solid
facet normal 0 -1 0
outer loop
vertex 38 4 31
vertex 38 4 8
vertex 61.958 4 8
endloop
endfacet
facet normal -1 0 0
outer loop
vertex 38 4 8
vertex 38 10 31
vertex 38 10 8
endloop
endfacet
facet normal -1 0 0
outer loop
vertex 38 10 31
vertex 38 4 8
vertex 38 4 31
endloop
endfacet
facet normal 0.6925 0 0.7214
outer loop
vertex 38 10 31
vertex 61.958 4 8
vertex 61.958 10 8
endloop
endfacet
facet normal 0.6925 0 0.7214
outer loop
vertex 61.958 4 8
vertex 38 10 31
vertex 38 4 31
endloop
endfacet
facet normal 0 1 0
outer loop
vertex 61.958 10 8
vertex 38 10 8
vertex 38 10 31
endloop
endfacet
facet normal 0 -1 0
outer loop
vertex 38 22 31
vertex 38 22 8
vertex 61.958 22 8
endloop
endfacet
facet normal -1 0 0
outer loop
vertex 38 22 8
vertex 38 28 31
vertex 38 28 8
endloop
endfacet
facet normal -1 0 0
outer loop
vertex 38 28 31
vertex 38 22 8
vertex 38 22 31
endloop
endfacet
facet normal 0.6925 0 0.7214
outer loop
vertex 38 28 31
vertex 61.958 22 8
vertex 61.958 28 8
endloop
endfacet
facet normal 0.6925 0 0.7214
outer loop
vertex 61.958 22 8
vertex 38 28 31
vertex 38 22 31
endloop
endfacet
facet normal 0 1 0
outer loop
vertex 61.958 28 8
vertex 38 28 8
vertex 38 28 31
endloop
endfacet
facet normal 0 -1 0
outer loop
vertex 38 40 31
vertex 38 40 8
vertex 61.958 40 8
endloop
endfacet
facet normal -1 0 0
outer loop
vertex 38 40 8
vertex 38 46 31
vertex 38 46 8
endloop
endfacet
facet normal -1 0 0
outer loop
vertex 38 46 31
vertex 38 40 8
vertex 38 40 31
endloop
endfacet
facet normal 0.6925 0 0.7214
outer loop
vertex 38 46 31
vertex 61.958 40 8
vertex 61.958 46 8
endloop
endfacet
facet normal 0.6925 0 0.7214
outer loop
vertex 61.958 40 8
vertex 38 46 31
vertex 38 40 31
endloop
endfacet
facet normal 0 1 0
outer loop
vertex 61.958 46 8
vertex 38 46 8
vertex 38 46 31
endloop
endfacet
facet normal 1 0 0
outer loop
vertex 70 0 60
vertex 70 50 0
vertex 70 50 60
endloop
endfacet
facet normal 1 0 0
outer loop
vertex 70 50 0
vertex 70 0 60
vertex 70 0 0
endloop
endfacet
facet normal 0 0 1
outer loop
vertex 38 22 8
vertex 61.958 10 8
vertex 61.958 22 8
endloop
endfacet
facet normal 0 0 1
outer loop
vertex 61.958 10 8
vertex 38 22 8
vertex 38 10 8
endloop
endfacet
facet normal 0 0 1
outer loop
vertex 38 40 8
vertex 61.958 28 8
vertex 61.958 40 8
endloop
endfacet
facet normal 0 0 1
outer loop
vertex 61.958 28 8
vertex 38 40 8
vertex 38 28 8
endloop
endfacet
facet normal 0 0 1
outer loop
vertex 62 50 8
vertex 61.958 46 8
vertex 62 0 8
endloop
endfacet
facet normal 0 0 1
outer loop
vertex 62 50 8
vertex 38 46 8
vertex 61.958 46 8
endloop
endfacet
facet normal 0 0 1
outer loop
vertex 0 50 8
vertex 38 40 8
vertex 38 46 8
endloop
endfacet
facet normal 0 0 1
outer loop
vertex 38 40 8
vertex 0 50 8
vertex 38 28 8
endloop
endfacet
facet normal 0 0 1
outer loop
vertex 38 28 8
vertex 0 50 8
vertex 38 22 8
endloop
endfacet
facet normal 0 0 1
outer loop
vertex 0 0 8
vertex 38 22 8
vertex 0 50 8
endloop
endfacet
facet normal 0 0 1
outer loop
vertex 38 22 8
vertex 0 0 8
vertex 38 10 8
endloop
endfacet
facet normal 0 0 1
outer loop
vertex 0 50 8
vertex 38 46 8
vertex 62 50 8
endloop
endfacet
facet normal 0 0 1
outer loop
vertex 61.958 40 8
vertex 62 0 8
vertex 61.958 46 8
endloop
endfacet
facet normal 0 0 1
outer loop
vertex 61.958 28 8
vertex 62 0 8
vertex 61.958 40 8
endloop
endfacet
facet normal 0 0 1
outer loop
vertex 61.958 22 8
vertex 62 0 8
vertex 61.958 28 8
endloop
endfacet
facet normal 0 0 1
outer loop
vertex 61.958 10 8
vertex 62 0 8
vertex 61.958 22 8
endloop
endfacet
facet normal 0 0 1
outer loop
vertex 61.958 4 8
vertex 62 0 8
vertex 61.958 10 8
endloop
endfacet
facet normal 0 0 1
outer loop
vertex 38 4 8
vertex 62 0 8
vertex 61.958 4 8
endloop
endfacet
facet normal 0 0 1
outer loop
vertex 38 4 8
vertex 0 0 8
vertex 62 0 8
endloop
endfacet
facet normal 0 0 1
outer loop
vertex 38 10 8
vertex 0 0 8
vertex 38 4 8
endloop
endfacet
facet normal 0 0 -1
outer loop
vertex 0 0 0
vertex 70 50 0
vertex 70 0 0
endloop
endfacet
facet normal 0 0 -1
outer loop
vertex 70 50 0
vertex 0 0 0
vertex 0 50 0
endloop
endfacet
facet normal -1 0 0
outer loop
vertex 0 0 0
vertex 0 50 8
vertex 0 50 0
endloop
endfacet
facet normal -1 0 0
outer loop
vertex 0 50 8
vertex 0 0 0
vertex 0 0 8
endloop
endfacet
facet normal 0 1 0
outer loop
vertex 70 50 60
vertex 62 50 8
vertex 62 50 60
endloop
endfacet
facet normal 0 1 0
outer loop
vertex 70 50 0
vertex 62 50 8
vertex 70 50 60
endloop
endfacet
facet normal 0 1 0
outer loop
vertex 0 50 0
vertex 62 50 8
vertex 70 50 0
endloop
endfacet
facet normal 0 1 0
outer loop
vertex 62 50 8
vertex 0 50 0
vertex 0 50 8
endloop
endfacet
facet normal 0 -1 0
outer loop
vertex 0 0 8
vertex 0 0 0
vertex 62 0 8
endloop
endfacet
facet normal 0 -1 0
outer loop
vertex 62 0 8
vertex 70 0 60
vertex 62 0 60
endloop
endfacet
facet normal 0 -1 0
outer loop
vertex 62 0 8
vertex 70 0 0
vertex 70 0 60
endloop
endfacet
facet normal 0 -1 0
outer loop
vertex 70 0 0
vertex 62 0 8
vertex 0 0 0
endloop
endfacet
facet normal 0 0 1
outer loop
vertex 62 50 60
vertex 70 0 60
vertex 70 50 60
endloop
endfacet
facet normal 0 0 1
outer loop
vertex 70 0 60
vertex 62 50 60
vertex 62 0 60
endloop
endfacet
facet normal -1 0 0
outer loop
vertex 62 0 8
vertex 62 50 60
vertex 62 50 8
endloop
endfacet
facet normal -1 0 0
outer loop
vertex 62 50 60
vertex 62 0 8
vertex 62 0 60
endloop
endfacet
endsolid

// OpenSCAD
$fn = 32;

// ----------------------------------------------------------------------
// Rib bracket: 3-gusset L bracket
// ----------------------------------------------------------------------

// --- parameters (mm) ---
base_l = 70;              // foot length, X
base_w = 50;              // foot width, Y
base_t = 8;               // foot thickness
plate_t = 8;              // upright plate thickness
plate_h = 60;             // overall height
gus_l = 24;               // gusset leg along the foot
gus_h = 24;               // gusset height
gus_t = 6;                // gusset thickness
gus_edge = 4;             // gusset margin from the foot edge
n_gus = 3;                // gusset count

gus_pitch = (base_w - 2 * gus_edge - gus_t) / (n_gus - 1);  // gusset pitch

union() {
  cube([base_l, base_w, base_t]);
  translate([base_l - plate_t, 0, base_t - 1])
    cube([plate_t, base_w, plate_h - base_t + 1]);
  for (i = [0 : n_gus - 1])
    translate([base_l - plate_t - gus_l, gus_edge + i * gus_pitch, base_t - 1])
      rotate([-90, 0, 0])
        linear_extrude(height = gus_t)
          polygon(points = [[0, 0], [gus_l + 1, 0], [0, -gus_h]]);
}
